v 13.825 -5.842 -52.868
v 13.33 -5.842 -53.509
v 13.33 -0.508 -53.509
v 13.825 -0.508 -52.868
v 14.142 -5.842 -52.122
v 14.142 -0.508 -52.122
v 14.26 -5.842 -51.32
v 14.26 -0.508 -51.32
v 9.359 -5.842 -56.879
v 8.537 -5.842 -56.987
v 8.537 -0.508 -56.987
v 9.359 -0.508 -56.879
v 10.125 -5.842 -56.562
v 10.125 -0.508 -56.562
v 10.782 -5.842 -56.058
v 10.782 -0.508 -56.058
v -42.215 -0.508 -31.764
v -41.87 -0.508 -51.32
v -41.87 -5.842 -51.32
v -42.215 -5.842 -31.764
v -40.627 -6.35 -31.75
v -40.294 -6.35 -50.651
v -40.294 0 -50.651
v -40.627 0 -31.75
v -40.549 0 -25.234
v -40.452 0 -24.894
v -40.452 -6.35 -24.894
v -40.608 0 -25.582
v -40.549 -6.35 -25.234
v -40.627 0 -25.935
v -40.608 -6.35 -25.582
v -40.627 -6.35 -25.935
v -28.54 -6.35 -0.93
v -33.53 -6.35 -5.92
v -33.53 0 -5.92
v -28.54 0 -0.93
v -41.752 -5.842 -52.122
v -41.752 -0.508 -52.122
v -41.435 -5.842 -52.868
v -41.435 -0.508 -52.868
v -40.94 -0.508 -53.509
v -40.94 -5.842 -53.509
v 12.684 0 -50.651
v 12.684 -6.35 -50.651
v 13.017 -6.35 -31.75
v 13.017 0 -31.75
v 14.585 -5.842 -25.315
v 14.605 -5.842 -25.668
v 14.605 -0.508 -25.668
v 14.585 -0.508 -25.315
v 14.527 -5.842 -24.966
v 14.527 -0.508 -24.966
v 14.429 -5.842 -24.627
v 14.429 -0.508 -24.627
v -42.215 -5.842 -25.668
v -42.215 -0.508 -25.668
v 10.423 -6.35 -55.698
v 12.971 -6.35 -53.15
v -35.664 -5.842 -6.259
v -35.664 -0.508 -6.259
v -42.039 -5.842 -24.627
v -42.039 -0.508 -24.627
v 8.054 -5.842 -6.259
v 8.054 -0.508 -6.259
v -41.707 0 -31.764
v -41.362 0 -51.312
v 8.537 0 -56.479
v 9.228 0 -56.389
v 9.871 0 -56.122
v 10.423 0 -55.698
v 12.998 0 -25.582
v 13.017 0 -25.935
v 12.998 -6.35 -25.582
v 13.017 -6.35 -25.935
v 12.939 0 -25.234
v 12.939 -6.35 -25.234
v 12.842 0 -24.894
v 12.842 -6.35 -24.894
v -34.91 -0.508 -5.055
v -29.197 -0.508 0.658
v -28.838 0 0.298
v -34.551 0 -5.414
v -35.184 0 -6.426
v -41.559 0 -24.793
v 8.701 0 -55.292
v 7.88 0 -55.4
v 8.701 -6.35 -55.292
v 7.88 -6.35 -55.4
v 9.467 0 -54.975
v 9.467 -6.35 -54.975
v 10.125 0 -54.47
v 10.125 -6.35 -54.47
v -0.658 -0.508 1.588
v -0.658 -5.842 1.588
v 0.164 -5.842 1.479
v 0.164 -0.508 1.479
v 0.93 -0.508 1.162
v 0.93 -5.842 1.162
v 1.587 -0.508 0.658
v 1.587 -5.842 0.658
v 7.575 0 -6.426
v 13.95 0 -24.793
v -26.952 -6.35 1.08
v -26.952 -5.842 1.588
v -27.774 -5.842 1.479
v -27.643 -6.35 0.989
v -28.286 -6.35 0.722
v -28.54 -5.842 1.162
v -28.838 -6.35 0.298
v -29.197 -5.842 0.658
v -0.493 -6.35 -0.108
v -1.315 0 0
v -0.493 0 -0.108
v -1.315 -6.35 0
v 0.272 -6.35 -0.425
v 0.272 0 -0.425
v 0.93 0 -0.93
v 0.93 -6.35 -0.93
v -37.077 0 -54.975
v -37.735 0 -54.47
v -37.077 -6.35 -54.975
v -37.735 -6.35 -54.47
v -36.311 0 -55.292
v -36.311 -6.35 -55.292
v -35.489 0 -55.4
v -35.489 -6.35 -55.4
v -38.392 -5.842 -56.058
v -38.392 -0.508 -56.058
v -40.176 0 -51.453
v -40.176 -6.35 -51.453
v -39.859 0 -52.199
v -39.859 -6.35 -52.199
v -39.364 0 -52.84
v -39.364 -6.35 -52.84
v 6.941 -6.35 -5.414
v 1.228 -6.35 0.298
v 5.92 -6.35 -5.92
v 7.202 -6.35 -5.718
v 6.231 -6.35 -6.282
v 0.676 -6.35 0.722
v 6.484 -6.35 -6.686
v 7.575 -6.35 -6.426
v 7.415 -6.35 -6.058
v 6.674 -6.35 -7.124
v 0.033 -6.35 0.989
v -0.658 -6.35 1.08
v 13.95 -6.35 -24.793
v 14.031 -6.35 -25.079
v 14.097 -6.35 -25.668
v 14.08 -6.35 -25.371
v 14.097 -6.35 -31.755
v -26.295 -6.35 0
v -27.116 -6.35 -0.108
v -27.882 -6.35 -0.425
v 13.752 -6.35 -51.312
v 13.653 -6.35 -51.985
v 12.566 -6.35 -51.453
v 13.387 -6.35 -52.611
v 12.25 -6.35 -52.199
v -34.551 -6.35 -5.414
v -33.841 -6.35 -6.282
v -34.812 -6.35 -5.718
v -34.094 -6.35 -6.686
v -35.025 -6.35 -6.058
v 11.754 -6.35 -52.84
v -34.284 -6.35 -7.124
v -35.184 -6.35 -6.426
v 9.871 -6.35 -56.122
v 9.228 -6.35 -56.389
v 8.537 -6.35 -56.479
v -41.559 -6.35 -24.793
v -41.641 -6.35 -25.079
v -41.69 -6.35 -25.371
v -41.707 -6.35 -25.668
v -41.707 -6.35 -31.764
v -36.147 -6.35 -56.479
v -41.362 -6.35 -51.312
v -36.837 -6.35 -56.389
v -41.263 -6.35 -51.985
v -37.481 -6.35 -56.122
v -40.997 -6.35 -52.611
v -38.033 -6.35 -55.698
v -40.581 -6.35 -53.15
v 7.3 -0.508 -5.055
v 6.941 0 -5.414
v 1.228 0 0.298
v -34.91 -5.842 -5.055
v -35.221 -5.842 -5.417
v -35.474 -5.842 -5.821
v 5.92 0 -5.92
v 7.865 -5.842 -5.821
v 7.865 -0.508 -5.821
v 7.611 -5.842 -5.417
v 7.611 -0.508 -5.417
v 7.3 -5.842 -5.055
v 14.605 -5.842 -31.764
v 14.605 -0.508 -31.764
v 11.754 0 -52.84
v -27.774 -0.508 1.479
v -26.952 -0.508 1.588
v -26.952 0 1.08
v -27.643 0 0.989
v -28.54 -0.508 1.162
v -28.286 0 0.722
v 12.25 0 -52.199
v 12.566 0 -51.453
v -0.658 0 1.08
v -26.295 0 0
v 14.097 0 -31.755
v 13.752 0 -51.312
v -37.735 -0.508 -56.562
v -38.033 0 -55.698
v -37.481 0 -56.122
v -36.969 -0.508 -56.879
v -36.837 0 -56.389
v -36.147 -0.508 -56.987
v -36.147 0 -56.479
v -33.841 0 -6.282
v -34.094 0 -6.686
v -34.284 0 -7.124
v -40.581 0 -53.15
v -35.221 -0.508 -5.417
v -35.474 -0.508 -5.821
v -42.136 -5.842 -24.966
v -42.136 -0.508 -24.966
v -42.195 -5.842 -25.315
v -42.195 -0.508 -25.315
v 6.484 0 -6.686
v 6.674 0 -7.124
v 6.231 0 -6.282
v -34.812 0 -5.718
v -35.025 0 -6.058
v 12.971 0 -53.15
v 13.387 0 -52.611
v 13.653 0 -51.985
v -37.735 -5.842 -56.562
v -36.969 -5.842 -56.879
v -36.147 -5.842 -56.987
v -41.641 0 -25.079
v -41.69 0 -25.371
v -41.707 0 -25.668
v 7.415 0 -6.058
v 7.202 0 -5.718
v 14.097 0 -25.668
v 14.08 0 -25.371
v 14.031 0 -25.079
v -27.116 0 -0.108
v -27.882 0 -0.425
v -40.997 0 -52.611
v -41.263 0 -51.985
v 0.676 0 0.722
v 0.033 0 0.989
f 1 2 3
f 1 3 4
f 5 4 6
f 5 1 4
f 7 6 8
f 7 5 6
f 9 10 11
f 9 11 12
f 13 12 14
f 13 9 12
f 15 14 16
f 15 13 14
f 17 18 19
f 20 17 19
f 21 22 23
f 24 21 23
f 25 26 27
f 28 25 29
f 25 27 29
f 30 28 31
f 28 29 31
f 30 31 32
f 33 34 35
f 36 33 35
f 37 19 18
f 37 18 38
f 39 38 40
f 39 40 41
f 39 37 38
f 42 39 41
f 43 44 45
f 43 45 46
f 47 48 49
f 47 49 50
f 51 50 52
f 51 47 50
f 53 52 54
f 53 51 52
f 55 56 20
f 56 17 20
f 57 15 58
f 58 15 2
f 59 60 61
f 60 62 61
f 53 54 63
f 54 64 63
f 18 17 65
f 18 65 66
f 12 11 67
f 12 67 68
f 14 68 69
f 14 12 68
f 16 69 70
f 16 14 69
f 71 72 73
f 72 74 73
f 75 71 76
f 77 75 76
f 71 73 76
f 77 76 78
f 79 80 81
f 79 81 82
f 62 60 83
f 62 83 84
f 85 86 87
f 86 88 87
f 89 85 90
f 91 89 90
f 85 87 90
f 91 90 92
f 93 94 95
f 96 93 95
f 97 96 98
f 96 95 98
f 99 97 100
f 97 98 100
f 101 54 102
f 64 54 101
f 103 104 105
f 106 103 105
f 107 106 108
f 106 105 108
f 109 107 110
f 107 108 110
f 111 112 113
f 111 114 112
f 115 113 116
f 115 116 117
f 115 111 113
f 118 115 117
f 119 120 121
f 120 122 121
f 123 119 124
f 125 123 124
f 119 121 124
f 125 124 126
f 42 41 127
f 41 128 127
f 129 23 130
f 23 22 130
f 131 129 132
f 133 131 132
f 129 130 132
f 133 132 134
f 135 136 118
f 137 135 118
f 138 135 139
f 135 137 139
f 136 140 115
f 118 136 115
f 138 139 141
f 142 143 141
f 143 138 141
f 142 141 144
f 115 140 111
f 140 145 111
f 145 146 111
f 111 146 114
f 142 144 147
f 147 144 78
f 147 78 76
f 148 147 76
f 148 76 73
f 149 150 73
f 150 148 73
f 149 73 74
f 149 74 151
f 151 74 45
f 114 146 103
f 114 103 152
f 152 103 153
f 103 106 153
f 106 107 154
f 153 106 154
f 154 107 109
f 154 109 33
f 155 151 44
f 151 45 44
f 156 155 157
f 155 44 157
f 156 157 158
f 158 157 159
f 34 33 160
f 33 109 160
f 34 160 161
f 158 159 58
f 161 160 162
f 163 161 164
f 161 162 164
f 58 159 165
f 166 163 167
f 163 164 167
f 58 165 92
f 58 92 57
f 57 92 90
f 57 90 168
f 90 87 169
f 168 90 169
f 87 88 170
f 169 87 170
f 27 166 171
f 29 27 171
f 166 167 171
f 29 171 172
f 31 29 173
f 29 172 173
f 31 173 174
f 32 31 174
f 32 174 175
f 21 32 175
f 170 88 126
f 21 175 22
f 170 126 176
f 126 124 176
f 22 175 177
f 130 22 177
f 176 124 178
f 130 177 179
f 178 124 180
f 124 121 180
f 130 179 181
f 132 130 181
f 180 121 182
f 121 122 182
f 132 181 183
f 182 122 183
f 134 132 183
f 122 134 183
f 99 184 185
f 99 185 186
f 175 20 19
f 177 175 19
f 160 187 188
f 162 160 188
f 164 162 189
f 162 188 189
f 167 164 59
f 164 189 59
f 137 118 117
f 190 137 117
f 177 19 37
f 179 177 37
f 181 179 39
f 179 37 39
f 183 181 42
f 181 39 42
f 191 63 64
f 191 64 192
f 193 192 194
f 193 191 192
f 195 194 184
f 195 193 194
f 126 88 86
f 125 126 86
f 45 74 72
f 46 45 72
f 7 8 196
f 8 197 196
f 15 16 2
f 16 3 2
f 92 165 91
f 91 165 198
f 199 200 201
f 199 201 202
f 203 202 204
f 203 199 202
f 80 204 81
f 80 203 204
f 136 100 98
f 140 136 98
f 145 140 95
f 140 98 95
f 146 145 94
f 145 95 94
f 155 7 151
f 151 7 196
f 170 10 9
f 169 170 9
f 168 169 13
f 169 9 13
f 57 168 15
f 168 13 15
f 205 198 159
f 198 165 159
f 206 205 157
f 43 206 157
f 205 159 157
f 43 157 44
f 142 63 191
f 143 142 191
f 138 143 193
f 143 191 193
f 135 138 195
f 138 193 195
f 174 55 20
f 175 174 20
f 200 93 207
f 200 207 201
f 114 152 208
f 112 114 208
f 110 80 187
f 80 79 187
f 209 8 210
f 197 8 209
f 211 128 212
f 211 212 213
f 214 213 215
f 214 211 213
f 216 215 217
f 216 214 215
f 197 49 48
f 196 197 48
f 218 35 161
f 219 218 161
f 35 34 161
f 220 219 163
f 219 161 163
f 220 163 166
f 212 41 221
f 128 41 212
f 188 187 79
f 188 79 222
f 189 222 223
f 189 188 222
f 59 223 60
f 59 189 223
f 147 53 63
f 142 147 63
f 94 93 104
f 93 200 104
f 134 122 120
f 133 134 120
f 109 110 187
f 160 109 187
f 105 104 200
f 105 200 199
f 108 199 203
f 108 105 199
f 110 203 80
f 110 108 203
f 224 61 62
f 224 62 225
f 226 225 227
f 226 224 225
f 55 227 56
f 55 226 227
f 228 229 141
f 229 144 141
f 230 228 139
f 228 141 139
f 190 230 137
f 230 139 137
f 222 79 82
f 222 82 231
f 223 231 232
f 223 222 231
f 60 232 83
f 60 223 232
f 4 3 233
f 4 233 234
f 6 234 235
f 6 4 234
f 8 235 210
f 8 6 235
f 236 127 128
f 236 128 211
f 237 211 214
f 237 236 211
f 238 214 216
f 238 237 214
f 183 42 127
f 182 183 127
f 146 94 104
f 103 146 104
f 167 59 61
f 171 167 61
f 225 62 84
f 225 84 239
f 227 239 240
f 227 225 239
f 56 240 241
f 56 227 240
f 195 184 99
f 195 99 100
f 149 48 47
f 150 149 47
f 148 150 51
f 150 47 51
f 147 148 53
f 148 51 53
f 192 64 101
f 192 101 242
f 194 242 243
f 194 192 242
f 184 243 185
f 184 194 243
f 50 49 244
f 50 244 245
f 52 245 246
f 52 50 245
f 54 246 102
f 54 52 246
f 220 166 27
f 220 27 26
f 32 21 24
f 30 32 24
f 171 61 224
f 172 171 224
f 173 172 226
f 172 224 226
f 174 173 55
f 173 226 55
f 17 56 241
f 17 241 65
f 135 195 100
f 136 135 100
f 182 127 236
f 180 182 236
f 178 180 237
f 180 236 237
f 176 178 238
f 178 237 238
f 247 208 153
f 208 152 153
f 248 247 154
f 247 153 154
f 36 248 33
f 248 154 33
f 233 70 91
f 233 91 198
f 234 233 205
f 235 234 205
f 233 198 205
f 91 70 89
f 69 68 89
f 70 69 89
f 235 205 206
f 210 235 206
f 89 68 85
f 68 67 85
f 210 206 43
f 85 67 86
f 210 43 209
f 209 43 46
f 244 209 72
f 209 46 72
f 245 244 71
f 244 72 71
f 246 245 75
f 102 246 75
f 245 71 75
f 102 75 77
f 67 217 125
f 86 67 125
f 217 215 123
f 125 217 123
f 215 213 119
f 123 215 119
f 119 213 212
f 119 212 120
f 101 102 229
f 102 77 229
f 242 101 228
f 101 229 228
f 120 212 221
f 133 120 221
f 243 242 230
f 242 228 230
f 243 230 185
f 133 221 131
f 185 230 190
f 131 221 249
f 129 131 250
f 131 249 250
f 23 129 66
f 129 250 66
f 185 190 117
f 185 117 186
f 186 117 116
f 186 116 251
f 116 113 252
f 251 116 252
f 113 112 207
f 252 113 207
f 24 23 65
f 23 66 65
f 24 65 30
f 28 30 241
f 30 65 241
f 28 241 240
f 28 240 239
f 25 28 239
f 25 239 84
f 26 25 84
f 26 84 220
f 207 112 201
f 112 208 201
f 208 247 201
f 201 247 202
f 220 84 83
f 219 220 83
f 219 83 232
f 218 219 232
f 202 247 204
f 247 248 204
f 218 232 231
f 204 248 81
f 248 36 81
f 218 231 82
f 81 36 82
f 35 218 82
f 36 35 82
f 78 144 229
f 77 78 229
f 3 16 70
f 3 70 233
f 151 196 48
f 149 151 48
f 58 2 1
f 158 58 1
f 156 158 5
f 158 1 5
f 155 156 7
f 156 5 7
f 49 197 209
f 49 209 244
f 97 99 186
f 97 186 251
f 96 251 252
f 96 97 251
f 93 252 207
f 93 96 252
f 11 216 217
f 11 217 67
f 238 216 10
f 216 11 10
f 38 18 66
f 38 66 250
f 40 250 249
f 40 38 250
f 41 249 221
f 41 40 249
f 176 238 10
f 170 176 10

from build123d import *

# Parameters (mm, degrees)
SKETCH1_W     = 1.5875
SKETCH1_H     = 6.35
FILLET1_R     = 3.175
CHAMFER1_SIZE = 0.508


with BuildPart() as part:
    # Sweep1: sweep along a path in Sketch2
    with BuildLine(Plane(origin=(0, 0, 0), x_dir=(1, 0, 0), z_dir=(0, 1, 0))) as sweep1_path:
        Line((0, 0), (-27.6098, 0))
        Line((-27.6098, 0), (-34.045051536, 6.435251536))
        Line((-34.045051536, 6.435251536), (-40.6273, 25.4))
        Line((-40.6273, 25.4), (-40.6273, 31.75))
        Line((-40.6273, 31.75), (-40.270978863, 51.933561137))
        Line((-40.270978863, 51.933561137), (-36.8046, 55.39994))
        Line((-36.8046, 55.39994), (9.1948, 55.39994))
        Line((9.1948, 55.39994), (12.661178863, 51.933561137))
        Line((12.661178863, 51.933561137), (13.0175, 31.75))
        Line((13.0175, 31.75), (13.0175, 25.4))
        Line((13.0175, 25.4), (6.435251536, 6.435251536))
        Line((6.435251536, 6.435251536), (0, 0))
    # Sketch1 → Sweep1 (sweep)
    with BuildSketch(Plane(origin=(0, 0, 0), x_dir=(0, 0, -1), z_dir=(1, 0, 0))):
        with Locations((-0.79375, -3.175)):
            Rectangle(SKETCH1_W, SKETCH1_H)
    sweep(path=sweep1_path.line, transition=Transition.RIGHT)

    # Fillet1
    fillet1_edges = [part.edges().sort_by_distance(p)[0] for p in [
        (7.815488456, -3.175, -5.570424426),
        (6.435251536, -3.175, -6.435251536),
        (-42.2148, -3.175, -25.132338463),
        (-40.6273, -3.175, -25.4),
        (-27.6098, -3.175, 0),
        (14.605, -3.175, -25.132338463),
        (13.0175, -3.175, -25.4),
        (-42.2148, -3.175, -31.764011792),
        (-28.26736403, -3.175, 1.5875),
        (-40.6273, -3.175, -31.75),
        (0.65756403, -3.175, 1.5875),
        (0, -3.175, 0),
        (14.605, -3.175, -31.764011792),
        (13.0175, -3.175, -31.75),
        (-41.846913397, -3.175, -52.602690633),
        (-40.270978863, -3.175, -51.933561137),
        (14.237113397, -3.175, -52.602690633),
        (12.661178863, -3.175, -51.933561137),
        (-37.46216403, -3.175, -56.98744),
        (-36.8046, -3.175, -55.39994),
        (9.85236403, -3.175, -56.98744),
        (9.1948, -3.175, -55.39994),
        (-35.425288456, -3.175, -5.570424426),
        (-34.045051536, -3.175, -6.435251536),
    ]]
    fillet(fillet1_edges, radius=FILLET1_R)

    # Chamfer1
    chamfer1_edges = [part.edges().sort_by_distance(p)[0] for p in [
        (-39.666104179, -6.35, -54.783499851),
        (-39.666104179, 0, -54.783499851),
        (-37.362055867, 0, -56.745757516),
        (-41.617523848, 0, -52.505293622),
        (-42.042174838, 0, -41.542243119),
        (-42.042174838, 0, -41.542243119),
        (-41.617523848, 0, -52.505293622),
        (-42.042174838, -6.35, -41.542243119),
        (-42.042174838, -6.35, -41.542243119),
        (-41.617523848, -6.35, -52.505293622),
        (-37.362055867, -6.35, -56.745757516),
        (-41.617523848, -6.35, -52.505293622),
        (-42.2148, 0, -28.715836665),
        (-42.170610697, 0, -25.139789031),
        (-42.2148, 0, -28.715836665),
        (-42.2148, -6.35, -28.715836665),
        (-42.170610697, -6.35, -25.139789031),
        (-42.2148, -6.35, -28.715836665),
        (-38.851780138, 0, -15.442818824),
        (-35.355298477, 0, -5.614278659),
        (-42.170610697, 0, -25.139789031),
        (-38.851780138, -6.35, -15.442818824),
        (-35.355298477, -6.35, -5.614278659),
        (-42.170610697, -6.35, -25.139789031),
        (-32.053589323, 0, -2.198725293),
        (-28.167255867, 0, 1.345817516),
        (-35.355298477, 0, -5.614278659),
        (-32.053589323, -6.35, -2.198725293),
        (-28.167255867, -6.35, 1.345817516),
        (-35.355298477, -6.35, -5.614278659),
        (-13.8049, -6.35, -56.98744),
        (-13.8049, 0, -56.98744),
        (9.752255867, 0, -56.745757516),
        (-37.362055867, 0, -56.745757516),
        (9.752255867, -6.35, -56.745757516),
        (-37.362055867, -6.35, -56.745757516),
        (12.056304179, -6.35, -54.783499851),
        (12.056304179, 0, -54.783499851),
        (14.007723848, 0, -52.505293622),
        (9.752255867, 0, -56.745757516),
        (14.007723848, -6.35, -52.505293622),
        (9.752255867, -6.35, -56.745757516),
        (14.605, -6.35, -28.715836665),
        (14.605, 0, -28.715836665),
        (14.560810697, 0, -25.139789031),
        (14.605, 0, -28.715836665),
        (14.432374838, 0, -41.542243119),
        (14.007723848, 0, -52.505293622),
        (14.432374838, 0, -41.542243119),
        (14.432374838, -6.35, -41.542243119),
        (14.007723848, -6.35, -52.505293622),
        (14.432374838, -6.35, -41.542243119),
        (14.560810697, -6.35, -25.139789031),
        (14.605, -6.35, -28.715836665),
        (11.241980138, -6.35, -15.442818824),
        (11.241980138, 0, -15.442818824),
        (7.745498477, 0, -5.614278659),
        (14.560810697, 0, -25.139789031),
        (7.745498477, -6.35, -5.614278659),
        (14.560810697, -6.35, -25.139789031),
        (4.443789323, -6.35, -2.198725293),
        (4.443789323, 0, -2.198725293),
        (0.557455867, 0, 1.345817516),
        (7.745498477, 0, -5.614278659),
        (0.557455867, -6.35, 1.345817516),
        (7.745498477, -6.35, -5.614278659),
        (-13.8049, 0, 1.5875),
        (-13.8049, -6.35, 1.5875),
        (-28.167255867, 0, 1.345817516),
        (0.557455867, 0, 1.345817516),
        (-28.167255867, -6.35, 1.345817516),
        (0.557455867, -6.35, 1.345817516),
    ]]
    chamfer(chamfer1_edges, length=CHAMFER1_SIZE)


solid = part.part
